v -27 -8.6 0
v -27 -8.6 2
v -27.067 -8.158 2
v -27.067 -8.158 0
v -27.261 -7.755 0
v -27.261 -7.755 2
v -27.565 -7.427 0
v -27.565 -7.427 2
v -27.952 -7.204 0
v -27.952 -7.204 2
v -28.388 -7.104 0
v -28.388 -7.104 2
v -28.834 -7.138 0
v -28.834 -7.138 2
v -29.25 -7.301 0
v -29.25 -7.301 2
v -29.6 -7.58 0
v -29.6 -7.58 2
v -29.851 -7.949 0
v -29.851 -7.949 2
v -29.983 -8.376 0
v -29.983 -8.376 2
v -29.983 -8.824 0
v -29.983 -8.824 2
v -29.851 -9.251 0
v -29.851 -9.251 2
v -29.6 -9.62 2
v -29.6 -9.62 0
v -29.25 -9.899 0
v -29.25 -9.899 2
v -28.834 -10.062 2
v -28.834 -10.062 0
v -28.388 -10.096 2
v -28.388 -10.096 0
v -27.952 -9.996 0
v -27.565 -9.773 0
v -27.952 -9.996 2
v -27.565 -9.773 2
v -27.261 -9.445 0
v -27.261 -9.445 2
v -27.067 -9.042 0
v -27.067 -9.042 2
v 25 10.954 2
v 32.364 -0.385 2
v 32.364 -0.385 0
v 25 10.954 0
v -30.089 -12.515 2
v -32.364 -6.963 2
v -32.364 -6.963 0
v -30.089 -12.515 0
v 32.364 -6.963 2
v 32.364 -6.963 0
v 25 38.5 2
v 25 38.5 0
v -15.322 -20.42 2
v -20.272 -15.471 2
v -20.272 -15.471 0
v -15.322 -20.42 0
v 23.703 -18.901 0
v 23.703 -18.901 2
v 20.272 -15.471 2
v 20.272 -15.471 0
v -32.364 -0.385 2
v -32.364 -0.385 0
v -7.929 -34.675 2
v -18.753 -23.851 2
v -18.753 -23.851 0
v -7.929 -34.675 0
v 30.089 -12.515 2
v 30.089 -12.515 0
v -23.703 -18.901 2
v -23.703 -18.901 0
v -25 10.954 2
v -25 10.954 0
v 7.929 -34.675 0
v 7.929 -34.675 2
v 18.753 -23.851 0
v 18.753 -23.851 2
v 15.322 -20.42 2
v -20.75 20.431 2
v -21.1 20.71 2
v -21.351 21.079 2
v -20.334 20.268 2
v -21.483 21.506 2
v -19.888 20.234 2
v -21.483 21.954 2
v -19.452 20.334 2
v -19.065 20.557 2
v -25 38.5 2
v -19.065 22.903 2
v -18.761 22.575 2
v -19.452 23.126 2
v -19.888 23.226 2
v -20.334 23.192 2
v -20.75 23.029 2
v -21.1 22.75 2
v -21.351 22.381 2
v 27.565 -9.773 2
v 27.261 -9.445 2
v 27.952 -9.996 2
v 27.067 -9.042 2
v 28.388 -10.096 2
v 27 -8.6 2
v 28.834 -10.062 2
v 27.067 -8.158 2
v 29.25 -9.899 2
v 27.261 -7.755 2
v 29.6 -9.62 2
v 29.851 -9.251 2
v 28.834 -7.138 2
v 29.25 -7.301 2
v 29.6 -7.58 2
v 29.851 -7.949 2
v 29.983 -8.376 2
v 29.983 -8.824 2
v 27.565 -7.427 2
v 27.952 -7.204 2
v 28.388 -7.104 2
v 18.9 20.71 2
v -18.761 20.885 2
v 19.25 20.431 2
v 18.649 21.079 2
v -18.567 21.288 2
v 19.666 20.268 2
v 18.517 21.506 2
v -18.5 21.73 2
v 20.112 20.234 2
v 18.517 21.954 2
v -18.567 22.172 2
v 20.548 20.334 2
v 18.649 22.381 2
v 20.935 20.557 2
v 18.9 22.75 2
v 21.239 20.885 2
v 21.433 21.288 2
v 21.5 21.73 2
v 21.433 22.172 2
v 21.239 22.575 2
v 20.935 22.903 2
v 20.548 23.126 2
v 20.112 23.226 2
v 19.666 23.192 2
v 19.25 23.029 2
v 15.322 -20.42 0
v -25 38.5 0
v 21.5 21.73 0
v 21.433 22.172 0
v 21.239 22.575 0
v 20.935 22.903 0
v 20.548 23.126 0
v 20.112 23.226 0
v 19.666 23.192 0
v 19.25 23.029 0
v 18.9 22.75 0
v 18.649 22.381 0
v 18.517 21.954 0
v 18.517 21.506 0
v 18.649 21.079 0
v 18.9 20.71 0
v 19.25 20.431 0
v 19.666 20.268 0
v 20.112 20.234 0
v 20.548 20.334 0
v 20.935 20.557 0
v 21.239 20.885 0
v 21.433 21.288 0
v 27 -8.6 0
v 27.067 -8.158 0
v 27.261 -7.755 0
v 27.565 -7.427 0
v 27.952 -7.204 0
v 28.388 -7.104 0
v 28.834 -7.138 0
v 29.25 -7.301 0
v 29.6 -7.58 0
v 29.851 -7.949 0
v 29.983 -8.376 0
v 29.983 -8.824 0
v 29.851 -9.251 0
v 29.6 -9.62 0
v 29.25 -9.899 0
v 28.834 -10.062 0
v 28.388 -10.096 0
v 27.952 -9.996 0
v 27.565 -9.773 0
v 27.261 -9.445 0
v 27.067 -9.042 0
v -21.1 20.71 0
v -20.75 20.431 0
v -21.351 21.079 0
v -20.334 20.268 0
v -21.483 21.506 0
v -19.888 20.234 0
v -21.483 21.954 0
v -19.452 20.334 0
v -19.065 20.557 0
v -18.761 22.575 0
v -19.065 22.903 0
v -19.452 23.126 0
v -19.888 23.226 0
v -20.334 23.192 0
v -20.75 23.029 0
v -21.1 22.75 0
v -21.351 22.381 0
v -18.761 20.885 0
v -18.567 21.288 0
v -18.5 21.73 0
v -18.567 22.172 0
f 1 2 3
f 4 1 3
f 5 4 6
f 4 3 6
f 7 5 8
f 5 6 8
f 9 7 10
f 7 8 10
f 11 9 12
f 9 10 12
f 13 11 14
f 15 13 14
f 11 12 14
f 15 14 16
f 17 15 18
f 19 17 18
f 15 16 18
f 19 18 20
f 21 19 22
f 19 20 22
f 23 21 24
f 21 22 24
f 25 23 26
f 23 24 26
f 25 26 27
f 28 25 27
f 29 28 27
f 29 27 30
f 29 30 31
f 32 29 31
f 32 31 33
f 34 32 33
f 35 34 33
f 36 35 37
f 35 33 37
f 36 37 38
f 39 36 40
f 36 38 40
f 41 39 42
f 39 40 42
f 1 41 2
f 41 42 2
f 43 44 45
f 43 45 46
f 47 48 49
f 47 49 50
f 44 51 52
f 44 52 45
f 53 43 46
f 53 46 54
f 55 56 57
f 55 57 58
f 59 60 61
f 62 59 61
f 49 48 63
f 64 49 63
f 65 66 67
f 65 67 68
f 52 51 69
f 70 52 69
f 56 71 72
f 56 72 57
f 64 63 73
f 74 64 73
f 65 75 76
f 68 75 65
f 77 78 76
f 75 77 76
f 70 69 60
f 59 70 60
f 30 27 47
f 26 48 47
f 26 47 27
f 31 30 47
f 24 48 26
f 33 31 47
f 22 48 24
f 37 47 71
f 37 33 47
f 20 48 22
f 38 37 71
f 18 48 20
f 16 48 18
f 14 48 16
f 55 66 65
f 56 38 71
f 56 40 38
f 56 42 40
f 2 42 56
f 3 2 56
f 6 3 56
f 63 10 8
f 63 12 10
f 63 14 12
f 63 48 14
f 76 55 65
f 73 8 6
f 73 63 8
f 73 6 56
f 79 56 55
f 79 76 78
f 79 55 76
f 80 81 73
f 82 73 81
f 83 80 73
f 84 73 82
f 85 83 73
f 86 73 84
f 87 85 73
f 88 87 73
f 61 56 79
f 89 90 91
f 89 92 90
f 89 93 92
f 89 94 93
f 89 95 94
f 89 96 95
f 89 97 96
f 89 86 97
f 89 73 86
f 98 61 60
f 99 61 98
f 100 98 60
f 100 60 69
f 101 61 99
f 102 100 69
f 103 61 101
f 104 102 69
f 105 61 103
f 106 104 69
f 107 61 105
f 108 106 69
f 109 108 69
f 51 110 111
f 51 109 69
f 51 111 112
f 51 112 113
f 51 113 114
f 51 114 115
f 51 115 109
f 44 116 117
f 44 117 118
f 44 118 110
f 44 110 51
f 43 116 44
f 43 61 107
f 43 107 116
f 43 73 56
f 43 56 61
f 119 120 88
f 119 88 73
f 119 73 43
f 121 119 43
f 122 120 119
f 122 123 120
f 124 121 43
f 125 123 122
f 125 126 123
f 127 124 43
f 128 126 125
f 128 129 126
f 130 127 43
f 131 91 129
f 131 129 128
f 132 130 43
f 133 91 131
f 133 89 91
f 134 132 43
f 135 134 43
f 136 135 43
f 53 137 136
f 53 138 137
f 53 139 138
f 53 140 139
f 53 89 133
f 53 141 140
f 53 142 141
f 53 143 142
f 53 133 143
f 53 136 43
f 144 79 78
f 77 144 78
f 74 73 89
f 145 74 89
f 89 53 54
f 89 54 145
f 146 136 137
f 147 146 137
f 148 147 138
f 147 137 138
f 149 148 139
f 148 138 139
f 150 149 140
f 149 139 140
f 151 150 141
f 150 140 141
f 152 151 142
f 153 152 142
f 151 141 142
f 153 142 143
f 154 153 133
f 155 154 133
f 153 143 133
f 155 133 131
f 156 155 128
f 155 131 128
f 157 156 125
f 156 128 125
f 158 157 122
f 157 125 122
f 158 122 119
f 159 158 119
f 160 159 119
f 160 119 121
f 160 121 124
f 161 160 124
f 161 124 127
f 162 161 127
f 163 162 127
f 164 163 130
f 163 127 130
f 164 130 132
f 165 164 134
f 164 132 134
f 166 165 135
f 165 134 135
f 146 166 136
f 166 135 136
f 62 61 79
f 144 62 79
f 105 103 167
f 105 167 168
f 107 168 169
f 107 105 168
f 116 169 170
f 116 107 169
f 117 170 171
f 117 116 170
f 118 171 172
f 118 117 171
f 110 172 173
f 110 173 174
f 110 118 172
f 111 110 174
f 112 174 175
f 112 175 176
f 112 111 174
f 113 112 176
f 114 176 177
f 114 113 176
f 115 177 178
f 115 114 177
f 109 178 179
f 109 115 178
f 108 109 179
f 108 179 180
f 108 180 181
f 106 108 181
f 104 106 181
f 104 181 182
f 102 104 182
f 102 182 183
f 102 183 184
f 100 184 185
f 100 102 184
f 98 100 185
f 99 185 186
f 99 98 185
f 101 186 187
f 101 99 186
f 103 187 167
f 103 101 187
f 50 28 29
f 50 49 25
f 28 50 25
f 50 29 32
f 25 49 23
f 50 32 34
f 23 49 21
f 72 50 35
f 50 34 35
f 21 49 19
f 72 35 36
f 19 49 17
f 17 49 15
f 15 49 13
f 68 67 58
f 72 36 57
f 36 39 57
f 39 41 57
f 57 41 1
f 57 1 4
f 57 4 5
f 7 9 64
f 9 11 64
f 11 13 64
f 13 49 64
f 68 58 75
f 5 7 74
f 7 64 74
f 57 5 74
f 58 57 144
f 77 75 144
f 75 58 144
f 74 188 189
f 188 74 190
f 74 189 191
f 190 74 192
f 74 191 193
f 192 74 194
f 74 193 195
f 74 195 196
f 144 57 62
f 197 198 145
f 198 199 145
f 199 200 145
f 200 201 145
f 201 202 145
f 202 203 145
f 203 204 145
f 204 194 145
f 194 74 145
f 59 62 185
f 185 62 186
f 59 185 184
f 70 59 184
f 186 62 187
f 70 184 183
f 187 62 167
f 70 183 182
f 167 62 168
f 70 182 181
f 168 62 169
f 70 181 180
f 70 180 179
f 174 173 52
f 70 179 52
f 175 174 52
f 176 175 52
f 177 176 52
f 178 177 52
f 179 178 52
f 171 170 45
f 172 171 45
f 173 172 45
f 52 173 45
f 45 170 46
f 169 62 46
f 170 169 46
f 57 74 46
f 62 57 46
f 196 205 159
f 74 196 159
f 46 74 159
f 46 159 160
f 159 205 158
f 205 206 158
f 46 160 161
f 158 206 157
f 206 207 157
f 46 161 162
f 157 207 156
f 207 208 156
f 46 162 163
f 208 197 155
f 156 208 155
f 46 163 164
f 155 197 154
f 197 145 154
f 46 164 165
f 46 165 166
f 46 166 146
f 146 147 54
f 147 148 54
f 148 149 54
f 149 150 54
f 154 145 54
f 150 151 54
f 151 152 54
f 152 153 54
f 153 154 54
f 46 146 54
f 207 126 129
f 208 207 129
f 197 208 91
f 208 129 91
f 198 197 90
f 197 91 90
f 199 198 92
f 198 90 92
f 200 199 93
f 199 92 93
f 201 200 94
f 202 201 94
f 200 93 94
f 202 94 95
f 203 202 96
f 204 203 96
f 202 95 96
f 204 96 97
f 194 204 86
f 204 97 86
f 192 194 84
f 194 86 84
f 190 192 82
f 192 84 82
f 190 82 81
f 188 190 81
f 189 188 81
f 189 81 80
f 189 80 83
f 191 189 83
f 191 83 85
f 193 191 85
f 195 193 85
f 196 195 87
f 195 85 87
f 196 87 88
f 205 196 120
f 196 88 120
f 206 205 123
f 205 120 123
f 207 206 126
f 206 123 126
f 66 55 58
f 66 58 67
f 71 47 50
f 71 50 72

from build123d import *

# Parameters (mm, degrees)
EXTRUDE1_DEPTH  = 2
SKETCH4_R       = 1.5
EXTRUDE3_DEPTH  = 2
EXTRUDE5_DEPTH  = 2
FILLET2_R       = 3
SKETCH7_R       = 1.5
EXTRUDE6_DEPTH  = 2
EXTRUDE7_DEPTH  = 2
EXTRUDE8_DEPTH  = 2
EXTRUDE9_DEPTH  = 2
EXTRUDE10_DEPTH = 2
EXTRUDE11_DEPTH = 2
SKETCH13_W      = 52.444820885
SKETCH13_H      = 24.426279397
EXTRUDE12_DEPTH = 2
SKETCH14_R      = 1.5
EXTRUDE13_DEPTH = 2


with BuildPart() as part:
    # Sketch1 → Extrude1 (new body)
    with BuildSketch(Plane.XY):
        Polygon((-15, 13.5), (-15, 38.5), (15, 38.5), (15, 13.5), (26.811651575, -4.688348425), (15, -16.5), (15, -26.5), (7.928932188, -33.571067812), (7.928932188, -52.571067812), (-7.928932188, -52.571067812), (-7.928932188, -33.571067812), (-15, -26.5), (-15, -16.5), (-26.811651575, -4.688348425), align=None)
    extrude(amount=EXTRUDE1_DEPTH)

    # Sketch4 → Extrude3 (add)
    with BuildSketch(Plane.XY.offset(2)):
        Polygon((-26.811651575, -4.688348425), (-32.363678884, -6.963209468), (-30.088817841, -12.515236776), (-22.212122569, -9.287877431), align=None)
        with Locations((-28.5, -8.6)):
            Circle(SKETCH4_R, mode=Mode.SUBTRACT)
    extrude3 = extrude(amount=-EXTRUDE3_DEPTH)

    # Mirror1: Extrude3 across plane
    add(extrude3.mirror(Plane(origin=(0, 0, 0), x_dir=(0, 0, 1), z_dir=(1, 0, 0))))

    # Sketch6 → Extrude5 (add)
    with BuildSketch(Plane.XY.offset(2)):
        Polygon((0, -44.571067812), (-7.928932188, -44.571067812), (-18, -54.642135624), (18, -54.642135624), (7.928932188, -44.571067812), align=None)
    extrude(amount=-EXTRUDE5_DEPTH)

    # Fillet2
    fillet2_edges = [part.edges().sort_by_distance(p)[0] for p in [
        (18, -54.642135624, 1),
        (-18, -54.642135624, 1),
    ]]
    fillet(fillet2_edges, radius=FILLET2_R)

    # Sketch7 → Extrude6 (cut)
    with BuildSketch(Plane.XY.offset(2)):
        with Locations((-11, -52.002135624)):
            Circle(SKETCH7_R)
    extrude6 = extrude(amount=-EXTRUDE6_DEPTH, mode=Mode.SUBTRACT)

    # Mirror4: Extrude6 across plane
    add(extrude6.mirror(Plane(origin=(0, 0, 0), x_dir=(0, 0, 1), z_dir=(1, 0, 0))), mode=Mode.SUBTRACT)

    # Sketch8 → Extrude7 (add)
    with BuildSketch(Plane.XY.offset(2)):
        Polygon((-26.811651575, -4.688348425), (-32.363678884, -6.963209468), (-32.363678884, -0.385171544), (-15, 26.352549211), (-15, 13.5), align=None)
    extrude7 = extrude(amount=-EXTRUDE7_DEPTH)

    # Sketch9 → Extrude8 (add)
    with BuildSketch(Plane.XY.offset(2)):
        Polygon((-22.212122569, -9.287877431), (-25.22165278, -10.520987907), (-15, -20.742640687), (-15, -16.5), align=None)
    extrude8 = extrude(amount=-EXTRUDE8_DEPTH)

    # Sketch10 → Extrude9 (add)
    with BuildSketch(Plane.XY.offset(2)):
        Polygon((-25.22165278, -10.520987907), (-30.088817841, -12.515236776), (-23.702612277, -18.90144234), (-20.271905312, -15.470735375), align=None)
    extrude9 = extrude(amount=-EXTRUDE9_DEPTH)

    # Sketch11 → Extrude10 (add)
    with BuildSketch(Plane.XY.offset(2)):
        Polygon((-15.322157844, -20.420482843), (-18.752864809, -23.851189808), (-7.928932188, -34.675122429), (-7.928932188, -33.571067812), (-15, -26.5), (-15, -20.742640687), align=None)
    extrude10 = extrude(amount=-EXTRUDE10_DEPTH)

    # Sketch12 → Extrude11 (add)
    with BuildSketch(Plane.XY.offset(2)):
        Polygon((-25, 10.953899573), (-25, 38.5), (-15, 38.5), (-15, 26.352549211), align=None)
    extrude11 = extrude(amount=-EXTRUDE11_DEPTH)

    # Mirror5: Extrude7, Extrude8, Extrude9, Extrude10 across plane
    add(extrude7.mirror(Plane(origin=(0, 0, 0), x_dir=(0, 0, 1), z_dir=(1, 0, 0))))
    add(extrude8.mirror(Plane(origin=(0, 0, 0), x_dir=(0, 0, 1), z_dir=(1, 0, 0))))
    add(extrude9.mirror(Plane(origin=(0, 0, 0), x_dir=(0, 0, 1), z_dir=(1, 0, 0))))
    add(extrude10.mirror(Plane(origin=(0, 0, 0), x_dir=(0, 0, 1), z_dir=(1, 0, 0))))

    # Mirror6: Extrude11 across plane
    add(extrude11.mirror(Plane(origin=(0, 0, 0), x_dir=(0, 0, 1), z_dir=(1, 0, 0))))

    # Sketch13 → Extrude12 (cut)
    with BuildSketch(Plane(origin=(0, 0, 0), x_dir=(-1, 0, 0), z_dir=(0, 0, -1))):
        with Locations((1.088066824, -46.888262128)):
            Rectangle(SKETCH13_W, SKETCH13_H)
    extrude(amount=-EXTRUDE12_DEPTH, mode=Mode.SUBTRACT)

    # Sketch14 → Extrude13 (cut)
    with BuildSketch(Plane.XY.offset(2)):
        with Locations((-20, 21.73)):
            Circle(SKETCH14_R)
        with Locations((20, 21.73)):
            Circle(SKETCH14_R)
    extrude(amount=-EXTRUDE13_DEPTH, mode=Mode.SUBTRACT)


solid = part.part
